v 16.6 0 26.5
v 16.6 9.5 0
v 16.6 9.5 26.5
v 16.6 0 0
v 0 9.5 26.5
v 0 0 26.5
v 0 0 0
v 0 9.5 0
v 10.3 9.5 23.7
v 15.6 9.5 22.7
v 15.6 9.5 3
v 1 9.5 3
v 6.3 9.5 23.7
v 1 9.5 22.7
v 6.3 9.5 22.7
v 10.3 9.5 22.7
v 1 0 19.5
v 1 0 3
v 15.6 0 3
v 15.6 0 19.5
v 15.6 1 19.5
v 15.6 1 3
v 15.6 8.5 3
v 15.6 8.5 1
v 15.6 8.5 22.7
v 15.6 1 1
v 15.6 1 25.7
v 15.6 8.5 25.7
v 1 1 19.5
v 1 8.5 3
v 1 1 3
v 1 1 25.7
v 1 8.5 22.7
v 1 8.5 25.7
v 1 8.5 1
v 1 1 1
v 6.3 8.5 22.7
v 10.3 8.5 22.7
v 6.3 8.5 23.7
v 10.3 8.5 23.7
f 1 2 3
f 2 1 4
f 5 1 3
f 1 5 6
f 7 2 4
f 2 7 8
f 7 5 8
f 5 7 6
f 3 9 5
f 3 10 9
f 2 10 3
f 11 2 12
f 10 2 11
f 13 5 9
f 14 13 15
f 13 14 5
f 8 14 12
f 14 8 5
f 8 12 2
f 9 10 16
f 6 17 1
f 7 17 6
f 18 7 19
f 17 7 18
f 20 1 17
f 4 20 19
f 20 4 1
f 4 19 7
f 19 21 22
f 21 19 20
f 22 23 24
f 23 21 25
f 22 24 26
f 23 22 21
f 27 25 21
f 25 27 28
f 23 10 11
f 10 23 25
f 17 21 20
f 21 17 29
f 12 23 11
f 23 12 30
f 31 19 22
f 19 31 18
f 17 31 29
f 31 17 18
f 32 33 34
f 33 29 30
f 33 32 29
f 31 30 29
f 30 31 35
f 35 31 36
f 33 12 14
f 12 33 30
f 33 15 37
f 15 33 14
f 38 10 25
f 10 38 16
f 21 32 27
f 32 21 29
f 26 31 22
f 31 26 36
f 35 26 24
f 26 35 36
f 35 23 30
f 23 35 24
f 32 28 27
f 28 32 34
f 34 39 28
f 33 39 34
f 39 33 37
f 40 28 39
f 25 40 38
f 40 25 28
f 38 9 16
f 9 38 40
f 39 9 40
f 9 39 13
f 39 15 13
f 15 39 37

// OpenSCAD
// plate();
keystone_mount();

// module plate()
module keystone_mount()
{
    distTop=7;
    distBottom=3;
    distHorizontal=1;

    ksWidth=14.6;
    ksHeight=16.5;
    ksHeightBack=19.7;

    depth=9.5;

    //calculated
    outerWidth=ksWidth+distHorizontal*2;
    outerHeight=ksHeight+distTop+distBottom;

    difference() {
        // outer measurements
        cube([outerWidth,depth,outerHeight]);

        // outer measurements keystone module
        translate([distHorizontal,-1,distBottom])
        cube([ksWidth,20,ksHeight]);

        // outer measurements keystone module backside
        translate([distHorizontal,1,distBottom])
        cube([ksWidth,20,ksHeightBack]);

        // bottom diff
        translate([distHorizontal,1,distBottom-distBottom+1])
        cube([ksWidth,depth-2,ksHeightBack]);

        // top diff for keystone latch
        translate([distHorizontal,1,distBottom+3])
        cube([ksWidth,depth-2,ksHeightBack]);
        
        // top diff for opening latch hole
        translate([distHorizontal+ksWidth/2-2,5,distBottom+1])
        cube([4,40,ksHeightBack]);



        // debug only
//        translate([-1,-1,-1])
//        cube([10,100,100]);
//        translate([10,-1,-1])
//        cube([100,100,100]);
    }
}
